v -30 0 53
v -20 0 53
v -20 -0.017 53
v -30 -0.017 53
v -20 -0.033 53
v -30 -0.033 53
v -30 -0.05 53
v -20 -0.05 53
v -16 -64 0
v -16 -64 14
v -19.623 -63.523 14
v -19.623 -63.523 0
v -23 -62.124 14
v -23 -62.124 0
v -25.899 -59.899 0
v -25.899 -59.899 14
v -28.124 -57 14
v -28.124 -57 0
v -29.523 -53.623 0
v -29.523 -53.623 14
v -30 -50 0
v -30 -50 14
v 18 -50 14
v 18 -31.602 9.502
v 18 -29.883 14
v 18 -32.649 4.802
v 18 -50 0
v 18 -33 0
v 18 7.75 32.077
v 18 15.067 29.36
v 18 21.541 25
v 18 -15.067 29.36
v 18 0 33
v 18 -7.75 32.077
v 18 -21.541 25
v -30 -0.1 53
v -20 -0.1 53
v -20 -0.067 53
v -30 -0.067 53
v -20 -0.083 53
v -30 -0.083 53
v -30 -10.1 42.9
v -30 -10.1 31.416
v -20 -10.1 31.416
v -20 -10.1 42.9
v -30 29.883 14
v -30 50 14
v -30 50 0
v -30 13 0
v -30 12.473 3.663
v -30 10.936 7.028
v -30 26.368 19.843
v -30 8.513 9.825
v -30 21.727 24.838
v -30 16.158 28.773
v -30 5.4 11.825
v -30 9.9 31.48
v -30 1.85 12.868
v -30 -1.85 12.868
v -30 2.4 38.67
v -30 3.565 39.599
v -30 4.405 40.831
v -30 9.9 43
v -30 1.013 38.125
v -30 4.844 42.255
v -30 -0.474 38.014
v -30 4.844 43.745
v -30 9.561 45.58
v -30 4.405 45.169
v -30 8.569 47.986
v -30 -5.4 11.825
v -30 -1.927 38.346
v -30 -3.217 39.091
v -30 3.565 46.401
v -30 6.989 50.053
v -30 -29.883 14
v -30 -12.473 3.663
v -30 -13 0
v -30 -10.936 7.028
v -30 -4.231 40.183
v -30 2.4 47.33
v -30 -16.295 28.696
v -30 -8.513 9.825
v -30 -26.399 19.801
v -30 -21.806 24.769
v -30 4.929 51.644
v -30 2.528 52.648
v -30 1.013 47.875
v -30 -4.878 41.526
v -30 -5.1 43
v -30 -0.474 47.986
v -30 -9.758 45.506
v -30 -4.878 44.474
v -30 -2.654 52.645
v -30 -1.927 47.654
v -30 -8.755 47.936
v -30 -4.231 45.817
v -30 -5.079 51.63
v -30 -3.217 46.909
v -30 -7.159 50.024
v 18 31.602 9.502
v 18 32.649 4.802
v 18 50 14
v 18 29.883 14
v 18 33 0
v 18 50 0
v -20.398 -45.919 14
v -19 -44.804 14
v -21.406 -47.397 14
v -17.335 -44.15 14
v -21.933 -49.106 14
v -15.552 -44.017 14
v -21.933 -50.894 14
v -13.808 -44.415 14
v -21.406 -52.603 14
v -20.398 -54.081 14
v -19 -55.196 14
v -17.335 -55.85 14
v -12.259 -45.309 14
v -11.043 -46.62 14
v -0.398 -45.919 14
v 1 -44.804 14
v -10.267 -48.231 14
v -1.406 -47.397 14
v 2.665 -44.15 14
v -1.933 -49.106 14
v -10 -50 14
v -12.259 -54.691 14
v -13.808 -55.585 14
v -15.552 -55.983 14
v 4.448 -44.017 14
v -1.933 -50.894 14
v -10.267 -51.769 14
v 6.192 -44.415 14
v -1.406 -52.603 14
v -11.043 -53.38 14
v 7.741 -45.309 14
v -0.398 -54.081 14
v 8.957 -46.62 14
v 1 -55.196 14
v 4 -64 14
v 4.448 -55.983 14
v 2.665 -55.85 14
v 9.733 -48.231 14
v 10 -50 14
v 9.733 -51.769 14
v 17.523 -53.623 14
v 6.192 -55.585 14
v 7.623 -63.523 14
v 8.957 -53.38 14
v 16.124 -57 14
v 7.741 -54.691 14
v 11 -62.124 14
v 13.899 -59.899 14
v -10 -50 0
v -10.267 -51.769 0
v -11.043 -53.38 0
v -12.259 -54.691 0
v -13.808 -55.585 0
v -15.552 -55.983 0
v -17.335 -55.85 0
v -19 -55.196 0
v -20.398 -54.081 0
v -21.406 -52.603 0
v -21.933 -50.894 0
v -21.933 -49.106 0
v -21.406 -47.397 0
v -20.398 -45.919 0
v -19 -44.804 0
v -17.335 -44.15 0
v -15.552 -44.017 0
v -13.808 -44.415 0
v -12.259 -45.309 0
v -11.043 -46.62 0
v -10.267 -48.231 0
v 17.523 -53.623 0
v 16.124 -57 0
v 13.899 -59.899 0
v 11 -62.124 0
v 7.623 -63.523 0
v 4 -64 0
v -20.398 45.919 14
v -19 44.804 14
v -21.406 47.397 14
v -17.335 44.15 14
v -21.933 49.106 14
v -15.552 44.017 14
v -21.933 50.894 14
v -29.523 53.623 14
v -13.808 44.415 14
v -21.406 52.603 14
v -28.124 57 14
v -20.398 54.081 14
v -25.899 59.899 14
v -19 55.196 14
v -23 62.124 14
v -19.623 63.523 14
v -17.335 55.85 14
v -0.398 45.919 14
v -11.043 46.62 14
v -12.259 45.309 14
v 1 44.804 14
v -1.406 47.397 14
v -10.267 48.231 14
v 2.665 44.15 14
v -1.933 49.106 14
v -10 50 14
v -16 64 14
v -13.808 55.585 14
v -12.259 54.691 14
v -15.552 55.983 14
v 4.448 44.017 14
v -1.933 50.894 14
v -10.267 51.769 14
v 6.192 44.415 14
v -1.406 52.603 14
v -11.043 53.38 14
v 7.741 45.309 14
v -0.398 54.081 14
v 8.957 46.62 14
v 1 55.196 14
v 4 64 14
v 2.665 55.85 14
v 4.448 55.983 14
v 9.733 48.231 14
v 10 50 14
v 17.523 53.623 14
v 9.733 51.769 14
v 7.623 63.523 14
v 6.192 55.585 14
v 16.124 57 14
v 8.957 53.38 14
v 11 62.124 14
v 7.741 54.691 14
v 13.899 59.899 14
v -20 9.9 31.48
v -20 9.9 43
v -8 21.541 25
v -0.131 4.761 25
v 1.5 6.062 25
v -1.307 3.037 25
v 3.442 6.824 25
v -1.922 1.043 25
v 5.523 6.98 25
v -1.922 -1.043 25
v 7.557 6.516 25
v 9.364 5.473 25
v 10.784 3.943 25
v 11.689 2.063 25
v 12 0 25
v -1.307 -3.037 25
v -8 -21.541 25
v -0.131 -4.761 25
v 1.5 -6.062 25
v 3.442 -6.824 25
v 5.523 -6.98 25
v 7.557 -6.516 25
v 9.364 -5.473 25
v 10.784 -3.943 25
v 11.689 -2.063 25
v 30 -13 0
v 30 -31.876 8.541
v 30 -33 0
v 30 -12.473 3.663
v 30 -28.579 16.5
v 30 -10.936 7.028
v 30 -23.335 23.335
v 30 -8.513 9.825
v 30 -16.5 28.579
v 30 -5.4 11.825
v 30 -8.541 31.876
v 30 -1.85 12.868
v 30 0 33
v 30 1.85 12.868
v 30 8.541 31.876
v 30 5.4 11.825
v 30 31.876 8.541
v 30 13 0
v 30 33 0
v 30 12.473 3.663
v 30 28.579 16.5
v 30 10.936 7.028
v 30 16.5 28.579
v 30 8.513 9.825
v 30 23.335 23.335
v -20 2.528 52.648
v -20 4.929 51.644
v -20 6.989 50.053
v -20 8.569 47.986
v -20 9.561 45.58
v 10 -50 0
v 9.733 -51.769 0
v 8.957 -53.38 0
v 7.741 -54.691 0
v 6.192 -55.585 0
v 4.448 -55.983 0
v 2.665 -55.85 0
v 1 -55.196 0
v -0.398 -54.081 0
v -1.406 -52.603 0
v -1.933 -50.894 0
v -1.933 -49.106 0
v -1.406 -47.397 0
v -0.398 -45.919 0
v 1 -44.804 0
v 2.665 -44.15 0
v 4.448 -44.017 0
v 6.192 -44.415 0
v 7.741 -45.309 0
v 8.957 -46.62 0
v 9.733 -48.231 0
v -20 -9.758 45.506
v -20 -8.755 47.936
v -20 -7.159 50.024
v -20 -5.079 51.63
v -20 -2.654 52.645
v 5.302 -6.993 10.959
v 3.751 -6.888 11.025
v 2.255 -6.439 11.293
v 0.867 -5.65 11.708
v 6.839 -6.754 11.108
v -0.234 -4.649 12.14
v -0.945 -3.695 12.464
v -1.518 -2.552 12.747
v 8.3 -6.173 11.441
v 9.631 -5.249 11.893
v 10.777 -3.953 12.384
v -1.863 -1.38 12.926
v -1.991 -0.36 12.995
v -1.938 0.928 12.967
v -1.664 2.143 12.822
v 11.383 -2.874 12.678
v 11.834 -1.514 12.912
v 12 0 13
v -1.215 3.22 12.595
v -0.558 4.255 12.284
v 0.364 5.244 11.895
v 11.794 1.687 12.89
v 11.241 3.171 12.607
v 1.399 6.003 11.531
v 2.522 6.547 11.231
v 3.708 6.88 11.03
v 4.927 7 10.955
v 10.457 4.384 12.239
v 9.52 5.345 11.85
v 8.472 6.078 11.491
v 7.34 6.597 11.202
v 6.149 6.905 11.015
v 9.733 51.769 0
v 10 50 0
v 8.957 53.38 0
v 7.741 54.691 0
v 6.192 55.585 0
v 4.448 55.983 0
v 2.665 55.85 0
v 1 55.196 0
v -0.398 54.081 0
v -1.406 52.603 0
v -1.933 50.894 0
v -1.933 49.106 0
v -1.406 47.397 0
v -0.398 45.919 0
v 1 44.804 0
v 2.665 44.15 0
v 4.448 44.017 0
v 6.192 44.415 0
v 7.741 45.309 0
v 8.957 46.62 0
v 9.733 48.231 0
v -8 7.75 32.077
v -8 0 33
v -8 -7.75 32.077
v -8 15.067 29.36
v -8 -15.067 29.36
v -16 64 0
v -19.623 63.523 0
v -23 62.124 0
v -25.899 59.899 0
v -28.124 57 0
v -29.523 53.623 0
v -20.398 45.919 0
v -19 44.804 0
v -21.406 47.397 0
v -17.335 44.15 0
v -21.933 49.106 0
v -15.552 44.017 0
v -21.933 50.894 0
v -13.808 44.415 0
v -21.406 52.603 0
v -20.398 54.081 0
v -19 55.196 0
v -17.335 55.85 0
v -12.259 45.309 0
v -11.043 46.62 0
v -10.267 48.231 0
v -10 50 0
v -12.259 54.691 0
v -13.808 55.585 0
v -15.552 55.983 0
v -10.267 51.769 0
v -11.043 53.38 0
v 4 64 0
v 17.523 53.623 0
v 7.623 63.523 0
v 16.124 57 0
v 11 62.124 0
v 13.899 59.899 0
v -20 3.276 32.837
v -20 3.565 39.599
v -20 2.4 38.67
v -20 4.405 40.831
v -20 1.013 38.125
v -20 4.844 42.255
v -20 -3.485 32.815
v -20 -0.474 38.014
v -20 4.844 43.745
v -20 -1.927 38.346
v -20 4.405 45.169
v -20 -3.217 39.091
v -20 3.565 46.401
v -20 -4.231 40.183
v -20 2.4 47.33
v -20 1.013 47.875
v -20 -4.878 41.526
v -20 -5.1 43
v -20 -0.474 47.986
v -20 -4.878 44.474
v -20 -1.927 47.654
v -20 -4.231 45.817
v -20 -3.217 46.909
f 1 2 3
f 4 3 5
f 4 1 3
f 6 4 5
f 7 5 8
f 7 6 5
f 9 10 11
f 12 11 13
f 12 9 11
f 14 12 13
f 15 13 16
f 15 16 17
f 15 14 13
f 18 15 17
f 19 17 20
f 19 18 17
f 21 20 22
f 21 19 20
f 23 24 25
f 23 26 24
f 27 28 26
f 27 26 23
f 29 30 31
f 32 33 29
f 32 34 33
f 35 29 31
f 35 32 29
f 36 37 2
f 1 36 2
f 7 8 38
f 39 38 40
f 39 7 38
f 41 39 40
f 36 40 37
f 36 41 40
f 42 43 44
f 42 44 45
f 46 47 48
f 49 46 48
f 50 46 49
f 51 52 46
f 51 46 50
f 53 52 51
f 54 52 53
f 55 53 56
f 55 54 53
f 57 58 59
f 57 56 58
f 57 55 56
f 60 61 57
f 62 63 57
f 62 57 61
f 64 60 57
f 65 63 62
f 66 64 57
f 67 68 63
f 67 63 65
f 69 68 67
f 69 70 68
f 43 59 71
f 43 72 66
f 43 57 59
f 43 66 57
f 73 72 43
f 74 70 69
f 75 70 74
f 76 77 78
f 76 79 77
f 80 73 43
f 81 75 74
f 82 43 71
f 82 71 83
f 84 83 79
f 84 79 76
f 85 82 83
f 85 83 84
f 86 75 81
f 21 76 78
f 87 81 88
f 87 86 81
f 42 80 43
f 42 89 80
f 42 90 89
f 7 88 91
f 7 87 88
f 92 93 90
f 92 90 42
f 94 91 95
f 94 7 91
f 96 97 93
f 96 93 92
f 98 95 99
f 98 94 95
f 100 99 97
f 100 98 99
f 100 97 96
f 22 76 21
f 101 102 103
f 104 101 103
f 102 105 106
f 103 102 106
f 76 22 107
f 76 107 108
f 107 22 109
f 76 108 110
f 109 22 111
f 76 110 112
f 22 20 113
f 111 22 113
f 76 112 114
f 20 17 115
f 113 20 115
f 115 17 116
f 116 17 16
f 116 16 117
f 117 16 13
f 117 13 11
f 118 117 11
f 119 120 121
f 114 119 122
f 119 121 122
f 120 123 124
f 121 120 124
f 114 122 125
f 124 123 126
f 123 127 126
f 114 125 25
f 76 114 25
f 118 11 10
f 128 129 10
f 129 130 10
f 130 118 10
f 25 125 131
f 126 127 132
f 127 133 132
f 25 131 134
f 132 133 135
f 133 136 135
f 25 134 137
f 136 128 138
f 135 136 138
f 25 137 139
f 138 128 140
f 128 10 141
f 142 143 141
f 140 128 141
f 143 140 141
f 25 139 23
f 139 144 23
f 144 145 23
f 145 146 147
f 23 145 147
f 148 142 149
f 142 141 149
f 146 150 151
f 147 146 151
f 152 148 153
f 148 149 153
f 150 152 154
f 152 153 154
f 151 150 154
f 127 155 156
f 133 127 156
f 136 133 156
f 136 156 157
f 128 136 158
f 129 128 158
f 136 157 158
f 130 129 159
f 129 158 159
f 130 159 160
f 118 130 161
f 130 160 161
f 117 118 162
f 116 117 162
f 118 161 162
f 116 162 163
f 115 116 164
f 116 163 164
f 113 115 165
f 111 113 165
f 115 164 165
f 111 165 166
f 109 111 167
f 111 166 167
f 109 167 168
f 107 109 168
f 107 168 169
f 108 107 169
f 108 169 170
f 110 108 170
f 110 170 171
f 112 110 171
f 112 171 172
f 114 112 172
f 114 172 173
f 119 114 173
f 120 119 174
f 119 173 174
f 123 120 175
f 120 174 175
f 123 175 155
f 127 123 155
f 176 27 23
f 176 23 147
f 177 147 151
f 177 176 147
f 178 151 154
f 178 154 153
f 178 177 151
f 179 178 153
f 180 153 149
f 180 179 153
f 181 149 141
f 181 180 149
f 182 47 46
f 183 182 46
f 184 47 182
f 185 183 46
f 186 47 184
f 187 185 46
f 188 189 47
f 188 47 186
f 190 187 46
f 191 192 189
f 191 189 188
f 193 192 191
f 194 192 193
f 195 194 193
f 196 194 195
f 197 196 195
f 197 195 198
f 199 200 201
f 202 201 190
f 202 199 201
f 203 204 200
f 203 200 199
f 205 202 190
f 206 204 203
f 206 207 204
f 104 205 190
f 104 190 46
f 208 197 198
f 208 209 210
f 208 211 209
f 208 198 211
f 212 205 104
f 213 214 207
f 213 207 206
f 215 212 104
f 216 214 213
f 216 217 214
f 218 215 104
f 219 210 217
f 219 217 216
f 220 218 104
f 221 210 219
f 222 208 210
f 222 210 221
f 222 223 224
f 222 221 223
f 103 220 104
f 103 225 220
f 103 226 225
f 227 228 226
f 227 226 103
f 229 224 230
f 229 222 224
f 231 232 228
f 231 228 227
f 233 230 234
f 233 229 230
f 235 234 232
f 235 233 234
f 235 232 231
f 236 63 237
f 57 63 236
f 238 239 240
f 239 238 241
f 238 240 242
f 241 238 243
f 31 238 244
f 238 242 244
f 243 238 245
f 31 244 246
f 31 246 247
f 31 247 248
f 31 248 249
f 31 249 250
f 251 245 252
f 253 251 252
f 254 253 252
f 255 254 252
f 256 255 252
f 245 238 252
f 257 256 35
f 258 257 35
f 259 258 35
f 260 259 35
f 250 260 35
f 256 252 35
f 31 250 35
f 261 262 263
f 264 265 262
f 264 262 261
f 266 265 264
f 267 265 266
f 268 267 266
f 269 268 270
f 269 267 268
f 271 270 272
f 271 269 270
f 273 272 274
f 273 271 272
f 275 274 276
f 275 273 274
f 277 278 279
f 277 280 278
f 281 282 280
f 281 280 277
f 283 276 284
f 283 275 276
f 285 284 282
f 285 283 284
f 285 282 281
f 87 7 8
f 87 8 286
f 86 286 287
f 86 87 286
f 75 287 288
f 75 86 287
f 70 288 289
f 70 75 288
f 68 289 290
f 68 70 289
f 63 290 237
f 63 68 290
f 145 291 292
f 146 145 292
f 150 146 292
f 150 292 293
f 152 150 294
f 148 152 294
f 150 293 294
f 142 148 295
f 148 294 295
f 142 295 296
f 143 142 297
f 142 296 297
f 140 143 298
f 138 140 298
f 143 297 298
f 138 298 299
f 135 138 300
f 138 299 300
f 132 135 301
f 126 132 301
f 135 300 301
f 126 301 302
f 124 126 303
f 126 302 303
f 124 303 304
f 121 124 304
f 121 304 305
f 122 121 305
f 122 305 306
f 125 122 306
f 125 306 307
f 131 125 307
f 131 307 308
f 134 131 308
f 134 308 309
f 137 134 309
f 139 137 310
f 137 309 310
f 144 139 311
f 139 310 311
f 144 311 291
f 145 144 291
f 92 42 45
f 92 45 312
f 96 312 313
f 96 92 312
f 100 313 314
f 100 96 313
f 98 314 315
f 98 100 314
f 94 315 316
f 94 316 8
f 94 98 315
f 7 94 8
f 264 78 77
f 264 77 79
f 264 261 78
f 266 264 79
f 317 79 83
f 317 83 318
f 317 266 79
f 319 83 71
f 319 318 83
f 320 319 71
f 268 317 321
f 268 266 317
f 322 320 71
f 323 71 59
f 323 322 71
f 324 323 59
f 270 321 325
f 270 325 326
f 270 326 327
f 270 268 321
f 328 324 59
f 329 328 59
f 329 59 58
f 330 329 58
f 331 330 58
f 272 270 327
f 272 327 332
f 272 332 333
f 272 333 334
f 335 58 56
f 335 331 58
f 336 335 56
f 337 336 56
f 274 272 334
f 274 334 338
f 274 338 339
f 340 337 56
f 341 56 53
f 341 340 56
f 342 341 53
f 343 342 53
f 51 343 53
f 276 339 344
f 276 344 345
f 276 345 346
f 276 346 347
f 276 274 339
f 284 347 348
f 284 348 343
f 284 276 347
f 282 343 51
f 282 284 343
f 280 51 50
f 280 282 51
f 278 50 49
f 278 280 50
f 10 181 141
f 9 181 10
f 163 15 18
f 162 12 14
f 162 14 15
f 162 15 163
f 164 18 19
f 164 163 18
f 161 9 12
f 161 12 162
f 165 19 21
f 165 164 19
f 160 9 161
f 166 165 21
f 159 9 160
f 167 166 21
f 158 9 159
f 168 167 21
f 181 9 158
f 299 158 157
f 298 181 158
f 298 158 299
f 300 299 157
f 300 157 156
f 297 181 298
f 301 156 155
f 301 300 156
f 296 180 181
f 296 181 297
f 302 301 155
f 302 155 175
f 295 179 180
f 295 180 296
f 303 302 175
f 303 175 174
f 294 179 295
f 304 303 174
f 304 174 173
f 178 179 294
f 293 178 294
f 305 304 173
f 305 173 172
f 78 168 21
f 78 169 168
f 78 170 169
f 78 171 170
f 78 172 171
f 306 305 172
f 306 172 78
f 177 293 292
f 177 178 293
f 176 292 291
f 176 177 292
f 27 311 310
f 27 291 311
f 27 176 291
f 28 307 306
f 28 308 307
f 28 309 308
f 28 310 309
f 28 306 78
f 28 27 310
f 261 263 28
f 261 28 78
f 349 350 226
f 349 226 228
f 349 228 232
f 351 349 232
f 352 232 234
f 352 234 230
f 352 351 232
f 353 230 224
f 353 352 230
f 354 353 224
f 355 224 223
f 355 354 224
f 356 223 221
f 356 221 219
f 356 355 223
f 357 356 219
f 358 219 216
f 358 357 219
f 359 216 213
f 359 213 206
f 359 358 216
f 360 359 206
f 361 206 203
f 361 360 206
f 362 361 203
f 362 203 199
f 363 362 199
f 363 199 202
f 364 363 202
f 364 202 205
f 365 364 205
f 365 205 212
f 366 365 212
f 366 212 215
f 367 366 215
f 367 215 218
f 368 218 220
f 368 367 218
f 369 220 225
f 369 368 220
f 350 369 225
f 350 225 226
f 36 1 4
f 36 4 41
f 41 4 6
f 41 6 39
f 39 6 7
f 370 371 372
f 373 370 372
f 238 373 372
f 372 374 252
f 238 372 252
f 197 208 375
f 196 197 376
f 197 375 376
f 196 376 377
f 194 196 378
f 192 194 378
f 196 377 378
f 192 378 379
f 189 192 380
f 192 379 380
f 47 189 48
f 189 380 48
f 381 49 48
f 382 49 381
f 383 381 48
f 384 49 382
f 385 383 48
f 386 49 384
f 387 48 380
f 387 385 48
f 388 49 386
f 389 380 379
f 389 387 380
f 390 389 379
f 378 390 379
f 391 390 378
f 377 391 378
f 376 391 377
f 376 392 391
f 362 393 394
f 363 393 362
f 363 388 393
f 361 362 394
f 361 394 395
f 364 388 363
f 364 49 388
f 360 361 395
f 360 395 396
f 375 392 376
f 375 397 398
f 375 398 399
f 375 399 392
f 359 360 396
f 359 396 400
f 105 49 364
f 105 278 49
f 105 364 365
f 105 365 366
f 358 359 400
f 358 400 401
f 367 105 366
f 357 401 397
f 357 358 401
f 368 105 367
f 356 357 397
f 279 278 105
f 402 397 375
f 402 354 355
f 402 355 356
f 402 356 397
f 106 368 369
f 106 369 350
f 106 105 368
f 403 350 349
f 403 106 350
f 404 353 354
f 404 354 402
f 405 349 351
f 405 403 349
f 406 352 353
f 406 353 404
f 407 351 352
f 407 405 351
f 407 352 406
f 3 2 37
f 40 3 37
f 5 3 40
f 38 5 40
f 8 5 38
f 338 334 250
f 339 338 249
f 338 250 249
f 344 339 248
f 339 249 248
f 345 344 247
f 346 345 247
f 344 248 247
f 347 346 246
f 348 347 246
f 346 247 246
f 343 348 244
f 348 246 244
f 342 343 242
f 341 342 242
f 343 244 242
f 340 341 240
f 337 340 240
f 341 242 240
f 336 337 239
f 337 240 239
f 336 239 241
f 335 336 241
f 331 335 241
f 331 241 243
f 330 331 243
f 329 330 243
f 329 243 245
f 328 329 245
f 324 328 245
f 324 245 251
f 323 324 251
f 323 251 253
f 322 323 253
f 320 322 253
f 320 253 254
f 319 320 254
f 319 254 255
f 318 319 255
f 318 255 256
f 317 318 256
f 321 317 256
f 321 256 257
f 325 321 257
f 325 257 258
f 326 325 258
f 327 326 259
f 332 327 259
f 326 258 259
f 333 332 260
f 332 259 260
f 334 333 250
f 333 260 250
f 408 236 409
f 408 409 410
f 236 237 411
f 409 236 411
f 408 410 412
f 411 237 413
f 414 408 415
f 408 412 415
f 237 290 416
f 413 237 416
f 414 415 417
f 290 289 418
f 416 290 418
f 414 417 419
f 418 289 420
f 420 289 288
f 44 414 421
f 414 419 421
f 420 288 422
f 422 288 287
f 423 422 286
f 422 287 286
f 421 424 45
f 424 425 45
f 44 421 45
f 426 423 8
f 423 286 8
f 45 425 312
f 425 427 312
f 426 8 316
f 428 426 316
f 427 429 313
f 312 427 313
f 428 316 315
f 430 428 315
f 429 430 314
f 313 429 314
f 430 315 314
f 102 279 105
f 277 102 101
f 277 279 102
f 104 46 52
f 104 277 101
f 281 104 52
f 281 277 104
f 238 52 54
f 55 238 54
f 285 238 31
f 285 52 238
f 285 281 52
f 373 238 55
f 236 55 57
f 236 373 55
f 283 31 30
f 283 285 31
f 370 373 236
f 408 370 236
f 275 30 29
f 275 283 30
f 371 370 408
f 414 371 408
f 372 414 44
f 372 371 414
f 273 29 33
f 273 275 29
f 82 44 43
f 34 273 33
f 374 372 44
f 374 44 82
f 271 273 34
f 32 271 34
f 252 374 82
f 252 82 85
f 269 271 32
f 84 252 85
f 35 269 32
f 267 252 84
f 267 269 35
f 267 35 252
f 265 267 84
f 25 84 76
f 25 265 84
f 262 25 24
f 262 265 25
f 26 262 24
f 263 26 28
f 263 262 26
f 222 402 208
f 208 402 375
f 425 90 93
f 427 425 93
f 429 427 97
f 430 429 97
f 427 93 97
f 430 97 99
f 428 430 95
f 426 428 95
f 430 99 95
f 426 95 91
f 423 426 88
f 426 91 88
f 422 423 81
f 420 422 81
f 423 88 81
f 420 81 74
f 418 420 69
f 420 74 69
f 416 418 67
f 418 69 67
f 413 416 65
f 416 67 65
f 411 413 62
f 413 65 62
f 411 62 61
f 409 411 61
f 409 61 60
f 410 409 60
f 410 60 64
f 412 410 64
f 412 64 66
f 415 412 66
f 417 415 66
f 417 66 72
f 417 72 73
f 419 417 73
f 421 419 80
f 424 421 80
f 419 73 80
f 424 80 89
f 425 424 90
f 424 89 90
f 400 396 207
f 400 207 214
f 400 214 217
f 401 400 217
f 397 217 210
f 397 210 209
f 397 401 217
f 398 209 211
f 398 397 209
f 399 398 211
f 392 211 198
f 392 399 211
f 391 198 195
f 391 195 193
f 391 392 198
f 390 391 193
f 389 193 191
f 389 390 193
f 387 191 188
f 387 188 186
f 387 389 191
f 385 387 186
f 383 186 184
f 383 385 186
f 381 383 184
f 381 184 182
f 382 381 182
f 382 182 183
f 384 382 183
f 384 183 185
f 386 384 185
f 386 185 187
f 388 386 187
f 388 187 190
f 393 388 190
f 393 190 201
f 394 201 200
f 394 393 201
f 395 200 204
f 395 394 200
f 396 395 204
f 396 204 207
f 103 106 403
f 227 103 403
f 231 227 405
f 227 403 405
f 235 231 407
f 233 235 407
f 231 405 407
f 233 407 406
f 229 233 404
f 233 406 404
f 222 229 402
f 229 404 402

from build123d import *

# Parameters (mm, degrees)
F1_DEPTH  = 30
F2_R      = 6
F3_DEPTH  = 14
F4_R      = 5
F5_DEPTH  = 10
F7_W      = 26
F7_H      = 66
F8_DEPTH  = 8
F9_R      = 7
F10_DEPTH = 25.001


# Not quite as in the source:
# - a pattern or mirror of a feature is missing from the dataset's text; its kind, count and spacing are read off the source's solid


with BuildPart() as f1:
    # F0 (on Right) → F1 (new body, symmetric)
    with BuildSketch(Plane.YZ):
        with BuildLine():
            Line((13, 0), (33, 0))
            ThreePointArc((33, 0), (0, 33), (-33, 0))
            Line((-33, 0), (-13, 0))
            ThreePointArc((-13, 0), (0, 13), (13, 0))
        make_face()
    extrude(amount=F1_DEPTH, both=True)

    # F2 (on face) → F3 (join)
    with BuildSketch(Plane(origin=(0, 0, 0), x_dir=(1, 0, 0), z_dir=(0, 0, -1))):
        with BuildLine():
            Line((18, 28.1032323837), (18, 33))
            Line((18, 33), (18, 50))
            ThreePointArc((18, 50), (13.8994949366, 59.8994949366), (4, 64))
            Line((4, 64), (-16, 64))
            ThreePointArc((-16, 64), (-25.8994949366, 59.8994949366), (-30, 50))
            Line((-30, 50), (-30, 33))
            Line((-30, 33), (-30, 28.1032323837))
            Line((-30, 28.1032323837), (18, 28.1032323837))
        make_face()
        with Locations((-16, 50)):
            Circle(F2_R, mode=Mode.SUBTRACT)
        with Locations((4, 50)):
            Circle(F2_R, mode=Mode.SUBTRACT)
    f3 = extrude(amount=-F3_DEPTH)

    # F3_copies: F3 across plane
    add(f3.mirror(Plane.ZX))

    # F4 (on face) → F5 (join)
    with BuildSketch(Plane(origin=(-30, 0, 0), x_dir=(0, -1, 0), z_dir=(-1, 0, 0))):
        with BuildLine():
            ThreePointArc((10.1, 42.9), (7.1594782015, 50.0240348036), (0.0501243796, 52.9998756204))
            ThreePointArc((0.0501243796, 52.9998756204), (-6.9886795739, 50.0534120749), (-9.9, 43))
            Line((-9.9, 43), (-9.9, 30.9537276626))
            Line((-9.9, 30.9537276626), (10.1, 30.9537276626))
            Line((10.1, 30.9537276626), (10.1, 42.9))
        make_face()
        with Locations((0.1, 43)):
            Circle(F4_R, mode=Mode.SUBTRACT)
    extrude(amount=-F5_DEPTH)

    # F7 (on offset) → F8 (cut)
    with BuildSketch(Plane(origin=(0, 0, 33), x_dir=(1, 0, 0), z_dir=(0, 0, -1))):
        with Locations((5, 0)):
            Rectangle(F7_W, F7_H)
    extrude(amount=F8_DEPTH, mode=Mode.SUBTRACT)

    # F9 (on face) → F10 (cut, through all)
    with BuildSketch(Plane.XY.offset(25)):
        with Locations((5, 0)):
            Circle(F9_R)
    extrude(amount=-F10_DEPTH, mode=Mode.SUBTRACT)


with BuildPart() as f5:
    # F4 (on face) → F5, piece 2 (new body)
    with BuildSketch(Plane(origin=(-30, 0, 0), x_dir=(0, -1, 0), z_dir=(-1, 0, 0))):
        with BuildLine():
            Line((0.1, 53), (0, 53))
            ThreePointArc((0, 53), (0.025062267, 52.999968905), (0.0501243796, 52.9998756204))
            ThreePointArc((0.0501243796, 52.9998756204), (0.0750621123, 52.999968905), (0.1, 53))
        make_face()
    extrude(amount=-F5_DEPTH)


solid = Compound([f1.part, f5.part])
